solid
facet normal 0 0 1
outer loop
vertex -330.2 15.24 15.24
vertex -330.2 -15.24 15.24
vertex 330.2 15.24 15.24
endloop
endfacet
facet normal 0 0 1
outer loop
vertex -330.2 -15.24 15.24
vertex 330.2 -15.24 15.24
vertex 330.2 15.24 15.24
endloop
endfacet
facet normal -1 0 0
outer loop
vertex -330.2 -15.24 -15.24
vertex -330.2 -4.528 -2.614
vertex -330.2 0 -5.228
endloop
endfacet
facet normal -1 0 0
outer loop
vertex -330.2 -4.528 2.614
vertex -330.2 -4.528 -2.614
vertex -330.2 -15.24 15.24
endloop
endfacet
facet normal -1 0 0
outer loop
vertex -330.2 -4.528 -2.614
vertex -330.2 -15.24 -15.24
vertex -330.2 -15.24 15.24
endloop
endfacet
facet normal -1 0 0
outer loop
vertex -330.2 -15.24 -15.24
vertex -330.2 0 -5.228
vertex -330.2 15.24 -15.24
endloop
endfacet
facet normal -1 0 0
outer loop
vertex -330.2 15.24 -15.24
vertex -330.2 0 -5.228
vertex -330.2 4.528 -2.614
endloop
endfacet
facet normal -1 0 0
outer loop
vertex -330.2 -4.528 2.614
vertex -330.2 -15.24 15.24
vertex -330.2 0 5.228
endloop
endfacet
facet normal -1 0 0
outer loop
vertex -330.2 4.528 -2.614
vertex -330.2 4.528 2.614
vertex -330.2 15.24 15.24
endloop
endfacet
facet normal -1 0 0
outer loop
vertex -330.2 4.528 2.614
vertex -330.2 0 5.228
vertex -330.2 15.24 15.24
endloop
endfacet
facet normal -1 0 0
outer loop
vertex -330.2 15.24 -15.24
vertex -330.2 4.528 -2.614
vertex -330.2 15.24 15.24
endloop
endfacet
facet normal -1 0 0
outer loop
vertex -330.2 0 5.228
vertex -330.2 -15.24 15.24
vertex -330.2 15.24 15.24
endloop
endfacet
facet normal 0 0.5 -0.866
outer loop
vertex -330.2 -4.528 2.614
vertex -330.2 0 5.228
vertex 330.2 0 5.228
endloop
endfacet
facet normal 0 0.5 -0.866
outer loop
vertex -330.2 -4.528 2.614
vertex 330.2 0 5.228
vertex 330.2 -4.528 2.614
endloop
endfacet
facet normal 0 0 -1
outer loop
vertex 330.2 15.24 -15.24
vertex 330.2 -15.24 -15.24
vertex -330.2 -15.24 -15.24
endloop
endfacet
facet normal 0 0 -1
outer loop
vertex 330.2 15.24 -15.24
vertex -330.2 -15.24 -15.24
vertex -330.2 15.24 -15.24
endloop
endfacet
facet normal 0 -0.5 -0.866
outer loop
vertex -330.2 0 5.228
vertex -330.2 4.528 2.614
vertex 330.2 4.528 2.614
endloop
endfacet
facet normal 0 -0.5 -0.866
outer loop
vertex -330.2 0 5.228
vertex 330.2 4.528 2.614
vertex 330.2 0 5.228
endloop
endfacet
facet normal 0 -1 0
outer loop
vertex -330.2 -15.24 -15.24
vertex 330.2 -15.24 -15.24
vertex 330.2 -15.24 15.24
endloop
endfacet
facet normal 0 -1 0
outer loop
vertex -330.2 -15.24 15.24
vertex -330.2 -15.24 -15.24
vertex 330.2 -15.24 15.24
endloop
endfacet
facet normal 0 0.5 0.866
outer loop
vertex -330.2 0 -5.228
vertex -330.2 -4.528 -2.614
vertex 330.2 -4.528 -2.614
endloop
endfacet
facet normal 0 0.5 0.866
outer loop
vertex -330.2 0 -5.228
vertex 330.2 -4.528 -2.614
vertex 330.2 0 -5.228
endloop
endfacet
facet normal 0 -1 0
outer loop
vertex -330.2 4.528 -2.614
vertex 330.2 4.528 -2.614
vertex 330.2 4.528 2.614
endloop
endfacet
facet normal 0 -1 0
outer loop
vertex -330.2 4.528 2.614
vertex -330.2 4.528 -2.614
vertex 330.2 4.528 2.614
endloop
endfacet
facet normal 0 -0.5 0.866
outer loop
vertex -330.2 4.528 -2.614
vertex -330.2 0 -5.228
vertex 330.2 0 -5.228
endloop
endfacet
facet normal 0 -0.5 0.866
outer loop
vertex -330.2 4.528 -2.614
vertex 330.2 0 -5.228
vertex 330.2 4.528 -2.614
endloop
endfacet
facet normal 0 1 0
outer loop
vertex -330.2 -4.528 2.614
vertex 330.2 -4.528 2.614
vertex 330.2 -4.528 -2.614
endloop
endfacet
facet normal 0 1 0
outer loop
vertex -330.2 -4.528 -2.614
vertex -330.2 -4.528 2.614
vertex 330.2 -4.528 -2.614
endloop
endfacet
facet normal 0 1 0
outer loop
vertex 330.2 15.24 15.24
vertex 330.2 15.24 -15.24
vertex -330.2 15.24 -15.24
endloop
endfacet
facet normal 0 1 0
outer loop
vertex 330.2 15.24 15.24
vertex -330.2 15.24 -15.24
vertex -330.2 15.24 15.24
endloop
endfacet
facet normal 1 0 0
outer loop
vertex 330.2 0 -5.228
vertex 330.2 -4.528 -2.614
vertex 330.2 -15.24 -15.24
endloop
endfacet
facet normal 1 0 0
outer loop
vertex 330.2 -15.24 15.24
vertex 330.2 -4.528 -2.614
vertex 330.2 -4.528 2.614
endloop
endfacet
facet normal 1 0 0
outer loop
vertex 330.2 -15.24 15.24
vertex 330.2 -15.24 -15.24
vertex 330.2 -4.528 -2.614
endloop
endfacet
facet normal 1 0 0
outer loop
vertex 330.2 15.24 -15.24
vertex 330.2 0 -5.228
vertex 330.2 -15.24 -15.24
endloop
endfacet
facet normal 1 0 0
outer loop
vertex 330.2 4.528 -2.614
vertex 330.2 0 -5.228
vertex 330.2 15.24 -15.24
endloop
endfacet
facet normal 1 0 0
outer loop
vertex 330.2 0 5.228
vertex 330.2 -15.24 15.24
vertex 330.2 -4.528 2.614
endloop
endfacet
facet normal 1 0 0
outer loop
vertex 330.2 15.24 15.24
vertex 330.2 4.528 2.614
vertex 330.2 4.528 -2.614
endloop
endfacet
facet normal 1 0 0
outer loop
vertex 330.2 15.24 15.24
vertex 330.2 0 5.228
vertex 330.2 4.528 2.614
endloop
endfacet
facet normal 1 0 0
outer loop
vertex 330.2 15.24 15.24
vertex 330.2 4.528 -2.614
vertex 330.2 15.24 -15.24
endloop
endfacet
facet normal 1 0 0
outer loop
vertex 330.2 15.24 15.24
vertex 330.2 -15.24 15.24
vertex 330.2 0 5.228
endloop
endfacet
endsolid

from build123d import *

# Parameters (mm, degrees)
F0_W     = 30.48
F0_H     = 30.48
F1_DEPTH = 330.2
F3_DEPTH = 660.401


with BuildPart() as f1:
    # F0 (on Right) → F1 (new body, symmetric)
    with BuildSketch(Plane.YZ):
        Rectangle(F0_W, F0_H)
    extrude(amount=F1_DEPTH, both=True)

    # F2 (on face) → F3 (cut, through all)
    with BuildSketch(Plane.YZ.offset(330.2)):
        Polygon((4.52755, -2.613982), (4.52755, 2.613982), (0, 5.227964), (-4.52755, 2.613982), (-4.52755, -2.613982), (0, -5.227964), align=None)
    extrude(amount=-F3_DEPTH, mode=Mode.SUBTRACT)


solid = f1.part
